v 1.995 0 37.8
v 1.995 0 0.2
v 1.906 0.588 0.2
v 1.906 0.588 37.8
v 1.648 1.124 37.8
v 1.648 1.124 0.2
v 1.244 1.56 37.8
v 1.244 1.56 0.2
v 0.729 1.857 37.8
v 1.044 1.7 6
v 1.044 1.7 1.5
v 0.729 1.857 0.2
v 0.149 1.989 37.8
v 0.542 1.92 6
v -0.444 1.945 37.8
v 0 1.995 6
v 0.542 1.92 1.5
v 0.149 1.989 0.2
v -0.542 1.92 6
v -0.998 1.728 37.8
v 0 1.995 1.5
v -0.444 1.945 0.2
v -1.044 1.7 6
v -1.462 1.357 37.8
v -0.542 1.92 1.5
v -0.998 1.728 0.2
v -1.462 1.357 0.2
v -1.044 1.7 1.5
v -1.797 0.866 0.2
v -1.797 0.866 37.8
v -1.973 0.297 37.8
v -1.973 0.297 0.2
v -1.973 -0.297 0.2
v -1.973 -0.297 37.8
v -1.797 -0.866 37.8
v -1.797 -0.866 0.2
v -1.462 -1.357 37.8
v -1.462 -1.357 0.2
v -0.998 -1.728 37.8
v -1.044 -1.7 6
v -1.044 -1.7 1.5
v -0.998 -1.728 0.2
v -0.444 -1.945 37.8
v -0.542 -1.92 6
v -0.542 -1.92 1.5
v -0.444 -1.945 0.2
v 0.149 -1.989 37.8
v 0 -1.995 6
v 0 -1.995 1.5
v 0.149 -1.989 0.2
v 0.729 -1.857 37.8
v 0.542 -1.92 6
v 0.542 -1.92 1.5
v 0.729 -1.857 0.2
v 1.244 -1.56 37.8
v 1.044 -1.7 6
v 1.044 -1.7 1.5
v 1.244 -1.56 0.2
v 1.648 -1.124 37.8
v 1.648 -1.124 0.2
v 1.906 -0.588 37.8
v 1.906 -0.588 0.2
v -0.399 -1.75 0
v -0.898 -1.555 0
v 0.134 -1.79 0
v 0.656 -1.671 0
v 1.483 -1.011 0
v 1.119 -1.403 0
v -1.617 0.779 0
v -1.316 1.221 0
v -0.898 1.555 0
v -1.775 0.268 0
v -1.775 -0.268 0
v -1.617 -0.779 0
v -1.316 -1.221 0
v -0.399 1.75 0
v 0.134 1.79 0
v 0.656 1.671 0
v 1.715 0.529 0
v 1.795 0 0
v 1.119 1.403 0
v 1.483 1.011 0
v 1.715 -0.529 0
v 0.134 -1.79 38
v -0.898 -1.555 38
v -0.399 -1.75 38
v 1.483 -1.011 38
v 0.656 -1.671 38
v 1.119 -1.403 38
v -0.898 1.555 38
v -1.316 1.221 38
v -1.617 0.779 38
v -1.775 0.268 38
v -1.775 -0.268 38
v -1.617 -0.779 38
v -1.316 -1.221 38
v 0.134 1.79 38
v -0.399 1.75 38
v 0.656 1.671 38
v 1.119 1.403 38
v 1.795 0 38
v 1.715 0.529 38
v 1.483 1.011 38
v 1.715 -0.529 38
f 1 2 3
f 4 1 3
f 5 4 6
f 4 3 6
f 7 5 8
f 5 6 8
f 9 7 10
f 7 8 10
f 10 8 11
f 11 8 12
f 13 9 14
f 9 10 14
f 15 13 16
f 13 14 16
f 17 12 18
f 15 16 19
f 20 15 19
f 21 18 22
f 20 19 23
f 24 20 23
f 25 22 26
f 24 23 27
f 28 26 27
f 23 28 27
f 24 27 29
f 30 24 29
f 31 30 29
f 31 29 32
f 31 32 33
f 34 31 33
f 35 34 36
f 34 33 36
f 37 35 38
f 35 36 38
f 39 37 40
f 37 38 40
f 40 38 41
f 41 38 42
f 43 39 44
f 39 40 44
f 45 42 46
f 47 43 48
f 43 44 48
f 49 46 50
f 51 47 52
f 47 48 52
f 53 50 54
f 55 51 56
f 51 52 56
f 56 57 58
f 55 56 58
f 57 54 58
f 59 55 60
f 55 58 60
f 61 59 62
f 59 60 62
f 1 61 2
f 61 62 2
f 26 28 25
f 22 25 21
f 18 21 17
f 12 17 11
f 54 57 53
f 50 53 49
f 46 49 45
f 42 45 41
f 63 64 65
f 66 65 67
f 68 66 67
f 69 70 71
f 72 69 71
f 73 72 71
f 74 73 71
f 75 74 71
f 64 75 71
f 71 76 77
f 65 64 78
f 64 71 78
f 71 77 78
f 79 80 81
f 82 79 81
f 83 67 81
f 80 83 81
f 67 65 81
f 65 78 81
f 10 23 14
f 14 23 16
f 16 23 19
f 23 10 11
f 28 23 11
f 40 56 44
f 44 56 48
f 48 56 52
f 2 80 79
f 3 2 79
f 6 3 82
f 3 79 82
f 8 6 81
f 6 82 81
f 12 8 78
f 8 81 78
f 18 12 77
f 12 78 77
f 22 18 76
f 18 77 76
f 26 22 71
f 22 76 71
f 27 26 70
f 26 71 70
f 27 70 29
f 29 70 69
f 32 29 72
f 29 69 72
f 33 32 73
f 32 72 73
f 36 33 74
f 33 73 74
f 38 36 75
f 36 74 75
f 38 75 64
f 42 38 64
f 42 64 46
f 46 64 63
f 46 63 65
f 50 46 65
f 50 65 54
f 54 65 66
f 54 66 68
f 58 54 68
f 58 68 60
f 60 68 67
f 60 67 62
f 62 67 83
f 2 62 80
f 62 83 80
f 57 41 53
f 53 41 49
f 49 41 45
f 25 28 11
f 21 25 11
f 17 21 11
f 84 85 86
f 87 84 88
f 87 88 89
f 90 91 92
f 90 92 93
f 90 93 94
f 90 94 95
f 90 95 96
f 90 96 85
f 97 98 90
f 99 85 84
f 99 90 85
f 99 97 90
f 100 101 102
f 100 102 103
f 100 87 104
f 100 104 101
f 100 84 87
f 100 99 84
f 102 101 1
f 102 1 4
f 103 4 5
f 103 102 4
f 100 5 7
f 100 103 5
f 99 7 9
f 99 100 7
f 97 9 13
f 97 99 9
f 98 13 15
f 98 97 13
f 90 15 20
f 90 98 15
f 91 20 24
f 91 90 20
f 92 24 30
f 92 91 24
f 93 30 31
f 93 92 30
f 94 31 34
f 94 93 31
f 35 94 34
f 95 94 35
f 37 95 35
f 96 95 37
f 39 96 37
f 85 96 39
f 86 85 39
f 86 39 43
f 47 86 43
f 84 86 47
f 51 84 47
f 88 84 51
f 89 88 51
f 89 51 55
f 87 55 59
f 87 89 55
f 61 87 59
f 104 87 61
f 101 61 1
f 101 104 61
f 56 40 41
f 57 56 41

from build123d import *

# Parameters (mm, degrees)
SKETCH1_R               = 1.995
BOSS_EXTRUDE1_DEPTH     = 38
SKETCH2_W               = 4.5
SKETCH2_H               = 0.920377874
CUT_EXTRUDE1_DEPTH      = 2.995
CUT_EXTRUDE1_DEPTH_BACK = 2.995
CHAMFER1_SIZE           = 0.2


with BuildPart() as part:
    # Sketch1 → Boss-Extrude1 (new body)
    with BuildSketch(Plane.XY):
        Circle(SKETCH1_R)
    extrude(amount=BOSS_EXTRUDE1_DEPTH)

    # Sketch2 → Cut-Extrude1 (cut, two sides)
    with BuildSketch(Plane(origin=(0, 0, 0), x_dir=(0, 0, -1), z_dir=(1, 0, 0))) as cut_extrude1_sk:
        with Locations((-3.75, 2.160188937)):
            Rectangle(SKETCH2_W, SKETCH2_H)
        with Locations((-3.75, -2.160188937)):
            Rectangle(SKETCH2_W, SKETCH2_H)
    extrude(amount=CUT_EXTRUDE1_DEPTH, mode=Mode.SUBTRACT)
    extrude(cut_extrude1_sk.sketch, amount=-CUT_EXTRUDE1_DEPTH_BACK, mode=Mode.SUBTRACT)

    # Chamfer1
    chamfer1_edges = [part.edges().sort_by_distance(p)[0] for p in [
        (-1.995, 0, 0),
        (-1.995, 0, 38),
    ]]
    chamfer(chamfer1_edges, length=CHAMFER1_SIZE)


solid = part.part
